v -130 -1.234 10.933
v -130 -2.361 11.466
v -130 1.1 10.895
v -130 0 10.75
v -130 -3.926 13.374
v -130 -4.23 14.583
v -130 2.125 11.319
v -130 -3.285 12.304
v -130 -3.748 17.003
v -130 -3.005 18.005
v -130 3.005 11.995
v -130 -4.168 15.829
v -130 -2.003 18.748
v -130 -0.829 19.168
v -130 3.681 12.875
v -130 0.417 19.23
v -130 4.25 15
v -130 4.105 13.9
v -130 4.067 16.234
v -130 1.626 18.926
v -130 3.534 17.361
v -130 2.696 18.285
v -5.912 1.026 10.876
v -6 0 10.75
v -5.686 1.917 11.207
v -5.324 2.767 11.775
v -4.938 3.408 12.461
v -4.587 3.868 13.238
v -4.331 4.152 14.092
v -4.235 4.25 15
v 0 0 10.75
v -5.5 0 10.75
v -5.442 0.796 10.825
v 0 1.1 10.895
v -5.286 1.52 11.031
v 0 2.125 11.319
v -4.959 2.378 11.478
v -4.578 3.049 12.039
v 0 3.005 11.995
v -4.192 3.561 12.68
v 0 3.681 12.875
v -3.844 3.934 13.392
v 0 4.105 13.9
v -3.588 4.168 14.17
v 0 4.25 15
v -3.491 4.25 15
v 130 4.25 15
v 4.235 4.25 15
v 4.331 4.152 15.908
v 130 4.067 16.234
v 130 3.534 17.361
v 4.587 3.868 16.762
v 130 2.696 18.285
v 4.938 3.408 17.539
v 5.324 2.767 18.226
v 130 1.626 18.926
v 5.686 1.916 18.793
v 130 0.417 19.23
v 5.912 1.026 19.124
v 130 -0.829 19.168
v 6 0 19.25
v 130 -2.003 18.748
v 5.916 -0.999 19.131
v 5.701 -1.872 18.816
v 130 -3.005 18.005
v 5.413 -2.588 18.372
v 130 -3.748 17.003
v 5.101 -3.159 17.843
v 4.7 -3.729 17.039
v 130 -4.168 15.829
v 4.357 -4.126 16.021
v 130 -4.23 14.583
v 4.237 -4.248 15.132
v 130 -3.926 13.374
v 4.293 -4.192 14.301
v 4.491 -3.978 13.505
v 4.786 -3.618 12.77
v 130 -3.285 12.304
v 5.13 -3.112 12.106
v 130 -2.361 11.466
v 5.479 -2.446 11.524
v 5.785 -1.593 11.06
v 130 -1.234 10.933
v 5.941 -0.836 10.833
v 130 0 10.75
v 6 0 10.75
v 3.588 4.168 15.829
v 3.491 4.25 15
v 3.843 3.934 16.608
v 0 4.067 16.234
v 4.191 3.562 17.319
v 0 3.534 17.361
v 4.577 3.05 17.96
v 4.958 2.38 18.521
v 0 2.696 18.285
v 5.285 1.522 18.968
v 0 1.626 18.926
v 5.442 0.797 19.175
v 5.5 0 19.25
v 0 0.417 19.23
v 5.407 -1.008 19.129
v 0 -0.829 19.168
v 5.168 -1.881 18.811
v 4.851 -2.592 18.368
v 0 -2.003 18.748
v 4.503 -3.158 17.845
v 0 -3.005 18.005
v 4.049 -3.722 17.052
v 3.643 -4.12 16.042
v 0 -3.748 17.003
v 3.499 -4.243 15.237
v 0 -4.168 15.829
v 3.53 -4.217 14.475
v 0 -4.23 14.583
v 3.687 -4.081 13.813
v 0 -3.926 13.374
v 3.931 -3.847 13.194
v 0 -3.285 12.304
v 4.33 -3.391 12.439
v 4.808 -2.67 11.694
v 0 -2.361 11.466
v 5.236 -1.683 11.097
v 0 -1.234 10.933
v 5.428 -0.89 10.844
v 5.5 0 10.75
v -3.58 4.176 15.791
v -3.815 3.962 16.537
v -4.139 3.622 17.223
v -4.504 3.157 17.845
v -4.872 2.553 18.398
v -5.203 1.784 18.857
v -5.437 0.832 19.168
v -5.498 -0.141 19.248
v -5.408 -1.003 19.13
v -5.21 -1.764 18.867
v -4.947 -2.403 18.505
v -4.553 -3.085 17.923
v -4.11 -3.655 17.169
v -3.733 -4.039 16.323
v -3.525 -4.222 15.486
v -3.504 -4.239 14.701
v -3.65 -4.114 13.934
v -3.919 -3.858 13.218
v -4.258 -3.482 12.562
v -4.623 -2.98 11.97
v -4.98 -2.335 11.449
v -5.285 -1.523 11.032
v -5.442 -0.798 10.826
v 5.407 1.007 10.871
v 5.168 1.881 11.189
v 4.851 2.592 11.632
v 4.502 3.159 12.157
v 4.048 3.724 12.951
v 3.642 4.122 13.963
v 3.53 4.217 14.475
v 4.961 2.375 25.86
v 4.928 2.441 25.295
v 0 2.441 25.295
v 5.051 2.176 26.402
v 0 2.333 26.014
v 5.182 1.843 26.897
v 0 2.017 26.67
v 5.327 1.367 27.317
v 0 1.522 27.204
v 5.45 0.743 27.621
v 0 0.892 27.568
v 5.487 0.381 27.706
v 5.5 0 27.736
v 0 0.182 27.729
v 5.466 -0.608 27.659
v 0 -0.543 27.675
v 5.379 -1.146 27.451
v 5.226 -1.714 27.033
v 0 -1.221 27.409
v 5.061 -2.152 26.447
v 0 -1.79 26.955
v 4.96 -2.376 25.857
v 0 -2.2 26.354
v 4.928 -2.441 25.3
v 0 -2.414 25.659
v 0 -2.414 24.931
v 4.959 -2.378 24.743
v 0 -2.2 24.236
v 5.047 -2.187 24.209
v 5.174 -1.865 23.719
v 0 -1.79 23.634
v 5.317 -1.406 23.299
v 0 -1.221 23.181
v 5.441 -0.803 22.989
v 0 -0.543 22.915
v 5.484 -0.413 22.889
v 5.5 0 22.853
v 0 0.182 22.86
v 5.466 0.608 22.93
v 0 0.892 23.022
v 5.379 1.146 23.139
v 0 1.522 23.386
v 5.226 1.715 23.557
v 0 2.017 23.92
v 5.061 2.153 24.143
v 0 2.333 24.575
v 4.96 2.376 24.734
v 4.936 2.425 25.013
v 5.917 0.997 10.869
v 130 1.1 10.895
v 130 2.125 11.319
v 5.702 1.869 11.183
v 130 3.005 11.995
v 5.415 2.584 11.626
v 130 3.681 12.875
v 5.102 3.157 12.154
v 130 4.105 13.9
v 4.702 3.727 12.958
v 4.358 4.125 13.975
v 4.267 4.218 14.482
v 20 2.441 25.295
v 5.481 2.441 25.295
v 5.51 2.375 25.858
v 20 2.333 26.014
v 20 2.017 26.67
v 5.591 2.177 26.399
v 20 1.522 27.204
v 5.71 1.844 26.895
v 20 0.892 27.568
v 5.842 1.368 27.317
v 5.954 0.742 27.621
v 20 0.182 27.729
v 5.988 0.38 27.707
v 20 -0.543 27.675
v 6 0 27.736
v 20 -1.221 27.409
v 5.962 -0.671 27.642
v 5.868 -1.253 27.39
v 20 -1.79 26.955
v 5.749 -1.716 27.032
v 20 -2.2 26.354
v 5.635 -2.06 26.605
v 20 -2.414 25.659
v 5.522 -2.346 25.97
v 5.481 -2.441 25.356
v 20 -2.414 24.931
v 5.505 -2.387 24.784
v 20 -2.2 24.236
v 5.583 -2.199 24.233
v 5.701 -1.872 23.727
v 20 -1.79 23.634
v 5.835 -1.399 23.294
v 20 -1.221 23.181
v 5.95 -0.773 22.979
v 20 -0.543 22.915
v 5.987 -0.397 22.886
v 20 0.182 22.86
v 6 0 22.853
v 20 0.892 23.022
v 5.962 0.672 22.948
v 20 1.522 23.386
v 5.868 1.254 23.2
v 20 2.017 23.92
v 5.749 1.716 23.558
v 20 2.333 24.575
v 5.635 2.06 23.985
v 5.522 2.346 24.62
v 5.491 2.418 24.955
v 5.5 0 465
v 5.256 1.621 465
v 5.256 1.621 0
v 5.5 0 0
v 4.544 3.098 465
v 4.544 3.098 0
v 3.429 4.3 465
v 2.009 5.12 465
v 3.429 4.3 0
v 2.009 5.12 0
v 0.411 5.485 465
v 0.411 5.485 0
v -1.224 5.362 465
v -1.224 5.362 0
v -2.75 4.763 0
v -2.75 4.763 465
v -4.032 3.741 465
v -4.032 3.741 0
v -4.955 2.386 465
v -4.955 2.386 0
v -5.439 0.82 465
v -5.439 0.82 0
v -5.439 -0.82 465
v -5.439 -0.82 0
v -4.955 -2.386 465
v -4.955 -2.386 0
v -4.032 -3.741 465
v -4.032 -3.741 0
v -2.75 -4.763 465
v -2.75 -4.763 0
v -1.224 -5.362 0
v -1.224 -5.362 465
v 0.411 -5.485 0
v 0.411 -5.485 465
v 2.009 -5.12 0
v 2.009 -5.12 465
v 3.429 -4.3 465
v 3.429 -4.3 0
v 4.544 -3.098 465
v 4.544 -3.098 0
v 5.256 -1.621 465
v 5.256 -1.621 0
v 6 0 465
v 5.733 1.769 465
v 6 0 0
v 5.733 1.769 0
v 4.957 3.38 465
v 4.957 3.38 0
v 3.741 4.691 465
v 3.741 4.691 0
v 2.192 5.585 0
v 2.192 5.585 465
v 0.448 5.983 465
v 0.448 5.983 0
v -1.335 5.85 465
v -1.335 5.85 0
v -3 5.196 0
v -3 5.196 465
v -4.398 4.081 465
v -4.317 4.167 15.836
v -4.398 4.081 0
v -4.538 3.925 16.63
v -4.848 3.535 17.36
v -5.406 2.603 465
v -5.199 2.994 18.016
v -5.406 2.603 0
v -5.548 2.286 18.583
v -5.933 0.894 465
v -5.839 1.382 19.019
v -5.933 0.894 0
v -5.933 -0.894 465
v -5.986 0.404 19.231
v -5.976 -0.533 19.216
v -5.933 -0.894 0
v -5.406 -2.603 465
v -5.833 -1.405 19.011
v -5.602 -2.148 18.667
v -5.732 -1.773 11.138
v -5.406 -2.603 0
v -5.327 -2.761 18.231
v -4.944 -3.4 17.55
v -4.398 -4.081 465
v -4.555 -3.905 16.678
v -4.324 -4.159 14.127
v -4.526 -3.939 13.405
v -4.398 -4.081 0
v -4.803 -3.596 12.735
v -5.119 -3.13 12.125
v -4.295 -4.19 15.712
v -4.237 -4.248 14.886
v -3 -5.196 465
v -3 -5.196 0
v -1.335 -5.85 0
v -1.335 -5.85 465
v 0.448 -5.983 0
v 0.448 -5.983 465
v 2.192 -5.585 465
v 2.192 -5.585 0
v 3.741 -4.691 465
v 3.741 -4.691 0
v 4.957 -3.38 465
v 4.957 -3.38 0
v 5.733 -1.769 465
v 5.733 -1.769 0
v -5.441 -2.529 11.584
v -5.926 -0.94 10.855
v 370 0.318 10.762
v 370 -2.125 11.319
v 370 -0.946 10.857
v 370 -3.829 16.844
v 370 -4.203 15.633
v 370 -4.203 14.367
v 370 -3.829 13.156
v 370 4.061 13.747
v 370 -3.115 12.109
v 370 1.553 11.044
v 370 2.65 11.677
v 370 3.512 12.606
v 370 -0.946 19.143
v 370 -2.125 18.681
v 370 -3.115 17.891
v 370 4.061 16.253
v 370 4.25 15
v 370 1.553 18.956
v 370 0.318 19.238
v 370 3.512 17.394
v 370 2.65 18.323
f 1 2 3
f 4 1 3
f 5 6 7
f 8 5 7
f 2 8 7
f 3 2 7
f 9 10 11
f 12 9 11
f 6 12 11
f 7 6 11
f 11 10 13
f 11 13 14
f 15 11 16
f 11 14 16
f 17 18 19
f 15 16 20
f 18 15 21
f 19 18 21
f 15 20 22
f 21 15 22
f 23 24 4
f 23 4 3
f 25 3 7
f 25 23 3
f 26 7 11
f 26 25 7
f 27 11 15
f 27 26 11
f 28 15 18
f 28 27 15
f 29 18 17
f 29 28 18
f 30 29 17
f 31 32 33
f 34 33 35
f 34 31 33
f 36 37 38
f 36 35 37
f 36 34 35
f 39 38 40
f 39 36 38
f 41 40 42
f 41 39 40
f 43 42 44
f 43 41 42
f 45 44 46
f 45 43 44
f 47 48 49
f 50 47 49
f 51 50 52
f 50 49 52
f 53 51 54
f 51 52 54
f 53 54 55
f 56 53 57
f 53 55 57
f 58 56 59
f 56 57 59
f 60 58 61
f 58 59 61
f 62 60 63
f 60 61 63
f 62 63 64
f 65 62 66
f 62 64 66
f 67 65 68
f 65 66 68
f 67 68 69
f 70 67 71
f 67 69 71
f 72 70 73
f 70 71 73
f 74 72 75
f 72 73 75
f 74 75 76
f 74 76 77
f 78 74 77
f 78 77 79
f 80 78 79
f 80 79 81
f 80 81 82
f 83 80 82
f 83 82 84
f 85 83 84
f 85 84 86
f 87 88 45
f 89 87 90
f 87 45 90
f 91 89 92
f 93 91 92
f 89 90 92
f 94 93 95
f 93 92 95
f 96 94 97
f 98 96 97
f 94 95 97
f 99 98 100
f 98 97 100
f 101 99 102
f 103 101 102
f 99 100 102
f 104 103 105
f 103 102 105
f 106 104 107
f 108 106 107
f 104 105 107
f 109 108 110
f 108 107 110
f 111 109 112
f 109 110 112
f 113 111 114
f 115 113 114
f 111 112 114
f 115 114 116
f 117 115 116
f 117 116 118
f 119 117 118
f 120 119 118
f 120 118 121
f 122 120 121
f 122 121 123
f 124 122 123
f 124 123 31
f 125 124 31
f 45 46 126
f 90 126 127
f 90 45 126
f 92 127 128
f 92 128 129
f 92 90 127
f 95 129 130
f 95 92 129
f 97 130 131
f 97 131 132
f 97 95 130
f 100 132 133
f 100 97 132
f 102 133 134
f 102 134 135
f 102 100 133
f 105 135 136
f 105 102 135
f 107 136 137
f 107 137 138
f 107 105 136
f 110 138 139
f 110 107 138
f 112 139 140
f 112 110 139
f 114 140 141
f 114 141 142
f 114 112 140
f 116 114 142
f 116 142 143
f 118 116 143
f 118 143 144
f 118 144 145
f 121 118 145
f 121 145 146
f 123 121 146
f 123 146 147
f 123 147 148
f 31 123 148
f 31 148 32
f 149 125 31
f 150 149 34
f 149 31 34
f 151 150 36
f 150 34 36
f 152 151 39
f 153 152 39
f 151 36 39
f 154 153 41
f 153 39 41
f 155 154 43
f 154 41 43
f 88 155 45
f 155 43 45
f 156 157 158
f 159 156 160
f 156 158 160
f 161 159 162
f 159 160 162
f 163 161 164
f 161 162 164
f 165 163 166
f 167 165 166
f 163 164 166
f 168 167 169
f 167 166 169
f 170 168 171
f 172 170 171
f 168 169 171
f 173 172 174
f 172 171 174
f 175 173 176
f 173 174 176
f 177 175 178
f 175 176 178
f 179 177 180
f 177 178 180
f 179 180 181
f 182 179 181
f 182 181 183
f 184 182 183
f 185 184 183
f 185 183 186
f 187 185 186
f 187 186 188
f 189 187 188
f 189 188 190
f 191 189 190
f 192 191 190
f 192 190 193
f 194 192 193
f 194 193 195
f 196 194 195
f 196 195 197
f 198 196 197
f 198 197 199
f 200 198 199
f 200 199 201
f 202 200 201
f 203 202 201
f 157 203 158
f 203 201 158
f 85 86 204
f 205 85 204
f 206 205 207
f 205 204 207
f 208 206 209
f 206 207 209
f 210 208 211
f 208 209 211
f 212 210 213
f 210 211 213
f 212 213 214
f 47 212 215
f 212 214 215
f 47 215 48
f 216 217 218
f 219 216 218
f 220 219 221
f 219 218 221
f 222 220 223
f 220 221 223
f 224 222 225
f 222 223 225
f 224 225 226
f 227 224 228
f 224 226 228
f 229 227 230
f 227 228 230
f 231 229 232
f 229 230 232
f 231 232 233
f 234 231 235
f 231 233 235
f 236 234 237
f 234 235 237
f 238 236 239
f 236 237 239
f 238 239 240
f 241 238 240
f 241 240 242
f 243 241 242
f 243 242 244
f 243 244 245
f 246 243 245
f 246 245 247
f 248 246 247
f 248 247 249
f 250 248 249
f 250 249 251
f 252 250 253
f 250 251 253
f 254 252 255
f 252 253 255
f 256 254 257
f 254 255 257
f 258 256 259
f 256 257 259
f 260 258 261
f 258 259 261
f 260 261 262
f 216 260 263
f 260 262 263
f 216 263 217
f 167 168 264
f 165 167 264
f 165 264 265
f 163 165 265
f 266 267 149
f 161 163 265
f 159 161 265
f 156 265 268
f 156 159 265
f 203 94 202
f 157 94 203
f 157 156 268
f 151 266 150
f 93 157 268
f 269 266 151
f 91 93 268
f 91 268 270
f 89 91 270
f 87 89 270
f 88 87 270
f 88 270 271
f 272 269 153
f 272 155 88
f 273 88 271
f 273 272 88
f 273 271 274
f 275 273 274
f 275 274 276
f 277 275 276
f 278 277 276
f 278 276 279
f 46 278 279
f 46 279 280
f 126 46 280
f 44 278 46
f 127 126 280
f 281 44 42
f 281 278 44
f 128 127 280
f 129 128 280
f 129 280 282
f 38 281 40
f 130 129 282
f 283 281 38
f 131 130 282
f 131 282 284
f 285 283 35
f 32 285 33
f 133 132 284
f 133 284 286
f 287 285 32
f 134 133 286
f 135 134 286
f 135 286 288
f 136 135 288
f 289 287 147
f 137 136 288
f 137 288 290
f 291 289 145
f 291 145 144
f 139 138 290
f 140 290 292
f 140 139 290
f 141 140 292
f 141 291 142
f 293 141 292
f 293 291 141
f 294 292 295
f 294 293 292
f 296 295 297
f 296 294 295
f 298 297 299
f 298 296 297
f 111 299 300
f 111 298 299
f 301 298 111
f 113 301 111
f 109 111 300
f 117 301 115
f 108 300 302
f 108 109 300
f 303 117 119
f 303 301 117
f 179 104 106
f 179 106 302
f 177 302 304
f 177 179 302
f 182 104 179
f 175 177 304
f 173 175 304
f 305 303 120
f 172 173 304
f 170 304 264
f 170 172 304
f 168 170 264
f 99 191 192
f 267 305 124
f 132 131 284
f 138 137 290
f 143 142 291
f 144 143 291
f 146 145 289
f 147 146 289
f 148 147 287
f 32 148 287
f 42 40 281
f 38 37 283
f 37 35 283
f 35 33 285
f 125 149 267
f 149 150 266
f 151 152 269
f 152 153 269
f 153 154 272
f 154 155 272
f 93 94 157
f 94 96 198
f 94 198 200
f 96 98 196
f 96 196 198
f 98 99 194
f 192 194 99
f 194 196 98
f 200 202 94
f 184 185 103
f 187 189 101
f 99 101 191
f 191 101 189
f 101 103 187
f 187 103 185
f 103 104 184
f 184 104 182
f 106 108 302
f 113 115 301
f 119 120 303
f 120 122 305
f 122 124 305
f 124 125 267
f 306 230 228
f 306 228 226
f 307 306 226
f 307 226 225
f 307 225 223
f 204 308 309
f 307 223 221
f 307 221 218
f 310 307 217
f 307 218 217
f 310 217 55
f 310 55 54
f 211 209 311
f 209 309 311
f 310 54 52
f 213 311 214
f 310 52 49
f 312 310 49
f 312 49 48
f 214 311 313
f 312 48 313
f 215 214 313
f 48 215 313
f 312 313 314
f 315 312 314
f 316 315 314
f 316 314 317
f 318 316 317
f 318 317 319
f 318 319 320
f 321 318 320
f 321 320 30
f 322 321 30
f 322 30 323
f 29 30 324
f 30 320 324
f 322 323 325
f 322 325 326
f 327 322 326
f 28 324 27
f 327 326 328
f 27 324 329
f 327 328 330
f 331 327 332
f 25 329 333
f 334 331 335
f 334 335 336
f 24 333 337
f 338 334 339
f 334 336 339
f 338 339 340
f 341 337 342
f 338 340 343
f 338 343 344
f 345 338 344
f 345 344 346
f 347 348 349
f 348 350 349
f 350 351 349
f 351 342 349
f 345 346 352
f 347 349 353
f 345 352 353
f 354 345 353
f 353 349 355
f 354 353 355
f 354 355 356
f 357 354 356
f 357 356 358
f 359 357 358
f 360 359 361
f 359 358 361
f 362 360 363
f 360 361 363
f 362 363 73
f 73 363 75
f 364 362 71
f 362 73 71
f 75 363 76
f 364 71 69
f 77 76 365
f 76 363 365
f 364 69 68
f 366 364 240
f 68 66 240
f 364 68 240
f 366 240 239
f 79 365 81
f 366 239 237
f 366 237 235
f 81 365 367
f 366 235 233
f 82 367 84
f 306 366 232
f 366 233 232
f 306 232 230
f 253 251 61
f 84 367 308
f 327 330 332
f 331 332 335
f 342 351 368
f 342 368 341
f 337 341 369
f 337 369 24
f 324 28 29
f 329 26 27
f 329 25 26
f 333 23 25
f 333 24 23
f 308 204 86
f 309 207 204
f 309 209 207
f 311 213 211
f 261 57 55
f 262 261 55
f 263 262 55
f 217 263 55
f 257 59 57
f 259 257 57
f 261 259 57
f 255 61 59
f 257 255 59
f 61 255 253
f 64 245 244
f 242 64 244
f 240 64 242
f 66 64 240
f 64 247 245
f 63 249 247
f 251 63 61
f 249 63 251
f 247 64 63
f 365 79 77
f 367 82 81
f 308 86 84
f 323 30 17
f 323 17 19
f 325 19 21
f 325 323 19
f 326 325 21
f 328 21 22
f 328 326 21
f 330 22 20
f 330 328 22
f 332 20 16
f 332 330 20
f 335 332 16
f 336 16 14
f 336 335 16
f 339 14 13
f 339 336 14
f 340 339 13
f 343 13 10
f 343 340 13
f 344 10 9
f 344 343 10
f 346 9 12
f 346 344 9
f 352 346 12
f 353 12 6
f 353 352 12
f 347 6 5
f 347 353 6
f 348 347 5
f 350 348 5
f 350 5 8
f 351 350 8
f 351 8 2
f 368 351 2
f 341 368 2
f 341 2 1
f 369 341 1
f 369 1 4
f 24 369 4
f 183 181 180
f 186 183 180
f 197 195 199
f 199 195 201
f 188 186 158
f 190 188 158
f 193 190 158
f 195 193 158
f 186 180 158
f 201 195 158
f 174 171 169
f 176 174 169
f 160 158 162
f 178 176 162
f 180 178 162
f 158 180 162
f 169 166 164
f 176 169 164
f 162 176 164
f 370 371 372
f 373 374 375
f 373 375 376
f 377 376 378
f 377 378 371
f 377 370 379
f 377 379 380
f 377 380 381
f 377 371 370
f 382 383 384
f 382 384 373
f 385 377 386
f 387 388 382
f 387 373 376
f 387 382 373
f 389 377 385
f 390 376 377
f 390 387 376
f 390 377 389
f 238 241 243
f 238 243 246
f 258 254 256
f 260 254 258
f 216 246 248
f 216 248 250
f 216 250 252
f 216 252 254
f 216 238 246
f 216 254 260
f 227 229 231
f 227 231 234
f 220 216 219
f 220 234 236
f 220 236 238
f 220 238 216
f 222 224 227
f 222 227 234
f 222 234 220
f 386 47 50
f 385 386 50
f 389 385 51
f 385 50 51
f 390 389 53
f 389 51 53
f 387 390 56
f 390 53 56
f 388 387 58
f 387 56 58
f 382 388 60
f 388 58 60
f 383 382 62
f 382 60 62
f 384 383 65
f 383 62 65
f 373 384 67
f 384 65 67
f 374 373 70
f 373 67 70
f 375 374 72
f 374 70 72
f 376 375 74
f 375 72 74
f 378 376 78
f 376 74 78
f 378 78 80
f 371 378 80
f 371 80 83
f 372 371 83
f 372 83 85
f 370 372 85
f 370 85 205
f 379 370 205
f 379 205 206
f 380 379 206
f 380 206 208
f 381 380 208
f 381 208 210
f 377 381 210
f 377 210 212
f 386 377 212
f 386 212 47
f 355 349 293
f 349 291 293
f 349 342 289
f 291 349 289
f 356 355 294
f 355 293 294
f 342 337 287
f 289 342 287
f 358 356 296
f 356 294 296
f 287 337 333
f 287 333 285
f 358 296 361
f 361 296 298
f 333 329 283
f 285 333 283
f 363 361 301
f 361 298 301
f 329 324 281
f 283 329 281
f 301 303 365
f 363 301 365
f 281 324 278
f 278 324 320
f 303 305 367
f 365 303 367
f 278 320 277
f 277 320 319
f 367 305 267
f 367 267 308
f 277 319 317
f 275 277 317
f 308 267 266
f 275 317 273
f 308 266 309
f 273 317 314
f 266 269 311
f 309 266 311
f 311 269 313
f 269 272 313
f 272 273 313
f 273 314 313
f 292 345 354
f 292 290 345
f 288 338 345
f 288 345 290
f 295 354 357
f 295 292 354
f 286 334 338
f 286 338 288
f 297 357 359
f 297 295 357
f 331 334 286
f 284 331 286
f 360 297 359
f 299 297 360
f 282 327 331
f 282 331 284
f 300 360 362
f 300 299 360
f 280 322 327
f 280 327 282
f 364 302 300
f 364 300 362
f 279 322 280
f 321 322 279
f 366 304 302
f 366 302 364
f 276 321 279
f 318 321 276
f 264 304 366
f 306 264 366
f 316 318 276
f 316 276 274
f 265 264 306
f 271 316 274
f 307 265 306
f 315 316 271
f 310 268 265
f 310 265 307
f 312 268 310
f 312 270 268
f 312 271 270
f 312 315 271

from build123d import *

# Parameters (mm, degrees)
F0_R      = 6
F0_R_2    = 5.5
F1_DEPTH  = 465
F2_R      = 2.4414340199
F3_DEPTH  = 20
F5_D      = 8
F5_DEPTH  = 6.0010001
F6_D      = 8
F7_DEPTH  = 130
F7_FACE_R = 4.25
F8_DEPTH  = 240


with BuildPart() as f1:
    # F0 (on Top) → F1 (new body)
    with BuildSketch(Plane.XY):
        Circle(F0_R)
        Circle(F0_R_2, mode=Mode.SUBTRACT)
    extrude(amount=F1_DEPTH)

    # F2 (on Right) → F3 (join)
    with BuildSketch(Plane.YZ):
        with Locations((0, 25.2948626876)):
            Circle(F2_R)
    extrude(amount=F3_DEPTH)

    # F5 (through all, one way)
    with BuildSketch(Plane.YZ):
        with Locations((0, 15)):
            Circle(F5_D / 2)
    extrude(amount=-F5_DEPTH, mode=Mode.SUBTRACT)

    # F6 (through all)
    with Locations(Plane(origin=(0, 0, 0), x_dir=(0, 1, 0), z_dir=(-1, 0, 0))):
        with Locations((0, -15)):
            Hole(F6_D / 2)

    # F4 (on Right) → F7 (join, symmetric)
    with BuildSketch(Plane.YZ):
        with BuildLine():
            ThreePointArc((0, 10.75), (3.00520382, 11.99479618), (4.25, 15))
            ThreePointArc((4.25, 15), (-3.00520382, 18.00520382), (0, 10.75))
        make_face()
    extrude(amount=F7_DEPTH, both=True)

    # F7_face (on face) → F8 (join)
    with BuildSketch(Plane(origin=(130, 0, 15), x_dir=(0, 1, 0), z_dir=(1, 0, 0))):
        Circle(F7_FACE_R)
    extrude(amount=F8_DEPTH)


solid = f1.part
